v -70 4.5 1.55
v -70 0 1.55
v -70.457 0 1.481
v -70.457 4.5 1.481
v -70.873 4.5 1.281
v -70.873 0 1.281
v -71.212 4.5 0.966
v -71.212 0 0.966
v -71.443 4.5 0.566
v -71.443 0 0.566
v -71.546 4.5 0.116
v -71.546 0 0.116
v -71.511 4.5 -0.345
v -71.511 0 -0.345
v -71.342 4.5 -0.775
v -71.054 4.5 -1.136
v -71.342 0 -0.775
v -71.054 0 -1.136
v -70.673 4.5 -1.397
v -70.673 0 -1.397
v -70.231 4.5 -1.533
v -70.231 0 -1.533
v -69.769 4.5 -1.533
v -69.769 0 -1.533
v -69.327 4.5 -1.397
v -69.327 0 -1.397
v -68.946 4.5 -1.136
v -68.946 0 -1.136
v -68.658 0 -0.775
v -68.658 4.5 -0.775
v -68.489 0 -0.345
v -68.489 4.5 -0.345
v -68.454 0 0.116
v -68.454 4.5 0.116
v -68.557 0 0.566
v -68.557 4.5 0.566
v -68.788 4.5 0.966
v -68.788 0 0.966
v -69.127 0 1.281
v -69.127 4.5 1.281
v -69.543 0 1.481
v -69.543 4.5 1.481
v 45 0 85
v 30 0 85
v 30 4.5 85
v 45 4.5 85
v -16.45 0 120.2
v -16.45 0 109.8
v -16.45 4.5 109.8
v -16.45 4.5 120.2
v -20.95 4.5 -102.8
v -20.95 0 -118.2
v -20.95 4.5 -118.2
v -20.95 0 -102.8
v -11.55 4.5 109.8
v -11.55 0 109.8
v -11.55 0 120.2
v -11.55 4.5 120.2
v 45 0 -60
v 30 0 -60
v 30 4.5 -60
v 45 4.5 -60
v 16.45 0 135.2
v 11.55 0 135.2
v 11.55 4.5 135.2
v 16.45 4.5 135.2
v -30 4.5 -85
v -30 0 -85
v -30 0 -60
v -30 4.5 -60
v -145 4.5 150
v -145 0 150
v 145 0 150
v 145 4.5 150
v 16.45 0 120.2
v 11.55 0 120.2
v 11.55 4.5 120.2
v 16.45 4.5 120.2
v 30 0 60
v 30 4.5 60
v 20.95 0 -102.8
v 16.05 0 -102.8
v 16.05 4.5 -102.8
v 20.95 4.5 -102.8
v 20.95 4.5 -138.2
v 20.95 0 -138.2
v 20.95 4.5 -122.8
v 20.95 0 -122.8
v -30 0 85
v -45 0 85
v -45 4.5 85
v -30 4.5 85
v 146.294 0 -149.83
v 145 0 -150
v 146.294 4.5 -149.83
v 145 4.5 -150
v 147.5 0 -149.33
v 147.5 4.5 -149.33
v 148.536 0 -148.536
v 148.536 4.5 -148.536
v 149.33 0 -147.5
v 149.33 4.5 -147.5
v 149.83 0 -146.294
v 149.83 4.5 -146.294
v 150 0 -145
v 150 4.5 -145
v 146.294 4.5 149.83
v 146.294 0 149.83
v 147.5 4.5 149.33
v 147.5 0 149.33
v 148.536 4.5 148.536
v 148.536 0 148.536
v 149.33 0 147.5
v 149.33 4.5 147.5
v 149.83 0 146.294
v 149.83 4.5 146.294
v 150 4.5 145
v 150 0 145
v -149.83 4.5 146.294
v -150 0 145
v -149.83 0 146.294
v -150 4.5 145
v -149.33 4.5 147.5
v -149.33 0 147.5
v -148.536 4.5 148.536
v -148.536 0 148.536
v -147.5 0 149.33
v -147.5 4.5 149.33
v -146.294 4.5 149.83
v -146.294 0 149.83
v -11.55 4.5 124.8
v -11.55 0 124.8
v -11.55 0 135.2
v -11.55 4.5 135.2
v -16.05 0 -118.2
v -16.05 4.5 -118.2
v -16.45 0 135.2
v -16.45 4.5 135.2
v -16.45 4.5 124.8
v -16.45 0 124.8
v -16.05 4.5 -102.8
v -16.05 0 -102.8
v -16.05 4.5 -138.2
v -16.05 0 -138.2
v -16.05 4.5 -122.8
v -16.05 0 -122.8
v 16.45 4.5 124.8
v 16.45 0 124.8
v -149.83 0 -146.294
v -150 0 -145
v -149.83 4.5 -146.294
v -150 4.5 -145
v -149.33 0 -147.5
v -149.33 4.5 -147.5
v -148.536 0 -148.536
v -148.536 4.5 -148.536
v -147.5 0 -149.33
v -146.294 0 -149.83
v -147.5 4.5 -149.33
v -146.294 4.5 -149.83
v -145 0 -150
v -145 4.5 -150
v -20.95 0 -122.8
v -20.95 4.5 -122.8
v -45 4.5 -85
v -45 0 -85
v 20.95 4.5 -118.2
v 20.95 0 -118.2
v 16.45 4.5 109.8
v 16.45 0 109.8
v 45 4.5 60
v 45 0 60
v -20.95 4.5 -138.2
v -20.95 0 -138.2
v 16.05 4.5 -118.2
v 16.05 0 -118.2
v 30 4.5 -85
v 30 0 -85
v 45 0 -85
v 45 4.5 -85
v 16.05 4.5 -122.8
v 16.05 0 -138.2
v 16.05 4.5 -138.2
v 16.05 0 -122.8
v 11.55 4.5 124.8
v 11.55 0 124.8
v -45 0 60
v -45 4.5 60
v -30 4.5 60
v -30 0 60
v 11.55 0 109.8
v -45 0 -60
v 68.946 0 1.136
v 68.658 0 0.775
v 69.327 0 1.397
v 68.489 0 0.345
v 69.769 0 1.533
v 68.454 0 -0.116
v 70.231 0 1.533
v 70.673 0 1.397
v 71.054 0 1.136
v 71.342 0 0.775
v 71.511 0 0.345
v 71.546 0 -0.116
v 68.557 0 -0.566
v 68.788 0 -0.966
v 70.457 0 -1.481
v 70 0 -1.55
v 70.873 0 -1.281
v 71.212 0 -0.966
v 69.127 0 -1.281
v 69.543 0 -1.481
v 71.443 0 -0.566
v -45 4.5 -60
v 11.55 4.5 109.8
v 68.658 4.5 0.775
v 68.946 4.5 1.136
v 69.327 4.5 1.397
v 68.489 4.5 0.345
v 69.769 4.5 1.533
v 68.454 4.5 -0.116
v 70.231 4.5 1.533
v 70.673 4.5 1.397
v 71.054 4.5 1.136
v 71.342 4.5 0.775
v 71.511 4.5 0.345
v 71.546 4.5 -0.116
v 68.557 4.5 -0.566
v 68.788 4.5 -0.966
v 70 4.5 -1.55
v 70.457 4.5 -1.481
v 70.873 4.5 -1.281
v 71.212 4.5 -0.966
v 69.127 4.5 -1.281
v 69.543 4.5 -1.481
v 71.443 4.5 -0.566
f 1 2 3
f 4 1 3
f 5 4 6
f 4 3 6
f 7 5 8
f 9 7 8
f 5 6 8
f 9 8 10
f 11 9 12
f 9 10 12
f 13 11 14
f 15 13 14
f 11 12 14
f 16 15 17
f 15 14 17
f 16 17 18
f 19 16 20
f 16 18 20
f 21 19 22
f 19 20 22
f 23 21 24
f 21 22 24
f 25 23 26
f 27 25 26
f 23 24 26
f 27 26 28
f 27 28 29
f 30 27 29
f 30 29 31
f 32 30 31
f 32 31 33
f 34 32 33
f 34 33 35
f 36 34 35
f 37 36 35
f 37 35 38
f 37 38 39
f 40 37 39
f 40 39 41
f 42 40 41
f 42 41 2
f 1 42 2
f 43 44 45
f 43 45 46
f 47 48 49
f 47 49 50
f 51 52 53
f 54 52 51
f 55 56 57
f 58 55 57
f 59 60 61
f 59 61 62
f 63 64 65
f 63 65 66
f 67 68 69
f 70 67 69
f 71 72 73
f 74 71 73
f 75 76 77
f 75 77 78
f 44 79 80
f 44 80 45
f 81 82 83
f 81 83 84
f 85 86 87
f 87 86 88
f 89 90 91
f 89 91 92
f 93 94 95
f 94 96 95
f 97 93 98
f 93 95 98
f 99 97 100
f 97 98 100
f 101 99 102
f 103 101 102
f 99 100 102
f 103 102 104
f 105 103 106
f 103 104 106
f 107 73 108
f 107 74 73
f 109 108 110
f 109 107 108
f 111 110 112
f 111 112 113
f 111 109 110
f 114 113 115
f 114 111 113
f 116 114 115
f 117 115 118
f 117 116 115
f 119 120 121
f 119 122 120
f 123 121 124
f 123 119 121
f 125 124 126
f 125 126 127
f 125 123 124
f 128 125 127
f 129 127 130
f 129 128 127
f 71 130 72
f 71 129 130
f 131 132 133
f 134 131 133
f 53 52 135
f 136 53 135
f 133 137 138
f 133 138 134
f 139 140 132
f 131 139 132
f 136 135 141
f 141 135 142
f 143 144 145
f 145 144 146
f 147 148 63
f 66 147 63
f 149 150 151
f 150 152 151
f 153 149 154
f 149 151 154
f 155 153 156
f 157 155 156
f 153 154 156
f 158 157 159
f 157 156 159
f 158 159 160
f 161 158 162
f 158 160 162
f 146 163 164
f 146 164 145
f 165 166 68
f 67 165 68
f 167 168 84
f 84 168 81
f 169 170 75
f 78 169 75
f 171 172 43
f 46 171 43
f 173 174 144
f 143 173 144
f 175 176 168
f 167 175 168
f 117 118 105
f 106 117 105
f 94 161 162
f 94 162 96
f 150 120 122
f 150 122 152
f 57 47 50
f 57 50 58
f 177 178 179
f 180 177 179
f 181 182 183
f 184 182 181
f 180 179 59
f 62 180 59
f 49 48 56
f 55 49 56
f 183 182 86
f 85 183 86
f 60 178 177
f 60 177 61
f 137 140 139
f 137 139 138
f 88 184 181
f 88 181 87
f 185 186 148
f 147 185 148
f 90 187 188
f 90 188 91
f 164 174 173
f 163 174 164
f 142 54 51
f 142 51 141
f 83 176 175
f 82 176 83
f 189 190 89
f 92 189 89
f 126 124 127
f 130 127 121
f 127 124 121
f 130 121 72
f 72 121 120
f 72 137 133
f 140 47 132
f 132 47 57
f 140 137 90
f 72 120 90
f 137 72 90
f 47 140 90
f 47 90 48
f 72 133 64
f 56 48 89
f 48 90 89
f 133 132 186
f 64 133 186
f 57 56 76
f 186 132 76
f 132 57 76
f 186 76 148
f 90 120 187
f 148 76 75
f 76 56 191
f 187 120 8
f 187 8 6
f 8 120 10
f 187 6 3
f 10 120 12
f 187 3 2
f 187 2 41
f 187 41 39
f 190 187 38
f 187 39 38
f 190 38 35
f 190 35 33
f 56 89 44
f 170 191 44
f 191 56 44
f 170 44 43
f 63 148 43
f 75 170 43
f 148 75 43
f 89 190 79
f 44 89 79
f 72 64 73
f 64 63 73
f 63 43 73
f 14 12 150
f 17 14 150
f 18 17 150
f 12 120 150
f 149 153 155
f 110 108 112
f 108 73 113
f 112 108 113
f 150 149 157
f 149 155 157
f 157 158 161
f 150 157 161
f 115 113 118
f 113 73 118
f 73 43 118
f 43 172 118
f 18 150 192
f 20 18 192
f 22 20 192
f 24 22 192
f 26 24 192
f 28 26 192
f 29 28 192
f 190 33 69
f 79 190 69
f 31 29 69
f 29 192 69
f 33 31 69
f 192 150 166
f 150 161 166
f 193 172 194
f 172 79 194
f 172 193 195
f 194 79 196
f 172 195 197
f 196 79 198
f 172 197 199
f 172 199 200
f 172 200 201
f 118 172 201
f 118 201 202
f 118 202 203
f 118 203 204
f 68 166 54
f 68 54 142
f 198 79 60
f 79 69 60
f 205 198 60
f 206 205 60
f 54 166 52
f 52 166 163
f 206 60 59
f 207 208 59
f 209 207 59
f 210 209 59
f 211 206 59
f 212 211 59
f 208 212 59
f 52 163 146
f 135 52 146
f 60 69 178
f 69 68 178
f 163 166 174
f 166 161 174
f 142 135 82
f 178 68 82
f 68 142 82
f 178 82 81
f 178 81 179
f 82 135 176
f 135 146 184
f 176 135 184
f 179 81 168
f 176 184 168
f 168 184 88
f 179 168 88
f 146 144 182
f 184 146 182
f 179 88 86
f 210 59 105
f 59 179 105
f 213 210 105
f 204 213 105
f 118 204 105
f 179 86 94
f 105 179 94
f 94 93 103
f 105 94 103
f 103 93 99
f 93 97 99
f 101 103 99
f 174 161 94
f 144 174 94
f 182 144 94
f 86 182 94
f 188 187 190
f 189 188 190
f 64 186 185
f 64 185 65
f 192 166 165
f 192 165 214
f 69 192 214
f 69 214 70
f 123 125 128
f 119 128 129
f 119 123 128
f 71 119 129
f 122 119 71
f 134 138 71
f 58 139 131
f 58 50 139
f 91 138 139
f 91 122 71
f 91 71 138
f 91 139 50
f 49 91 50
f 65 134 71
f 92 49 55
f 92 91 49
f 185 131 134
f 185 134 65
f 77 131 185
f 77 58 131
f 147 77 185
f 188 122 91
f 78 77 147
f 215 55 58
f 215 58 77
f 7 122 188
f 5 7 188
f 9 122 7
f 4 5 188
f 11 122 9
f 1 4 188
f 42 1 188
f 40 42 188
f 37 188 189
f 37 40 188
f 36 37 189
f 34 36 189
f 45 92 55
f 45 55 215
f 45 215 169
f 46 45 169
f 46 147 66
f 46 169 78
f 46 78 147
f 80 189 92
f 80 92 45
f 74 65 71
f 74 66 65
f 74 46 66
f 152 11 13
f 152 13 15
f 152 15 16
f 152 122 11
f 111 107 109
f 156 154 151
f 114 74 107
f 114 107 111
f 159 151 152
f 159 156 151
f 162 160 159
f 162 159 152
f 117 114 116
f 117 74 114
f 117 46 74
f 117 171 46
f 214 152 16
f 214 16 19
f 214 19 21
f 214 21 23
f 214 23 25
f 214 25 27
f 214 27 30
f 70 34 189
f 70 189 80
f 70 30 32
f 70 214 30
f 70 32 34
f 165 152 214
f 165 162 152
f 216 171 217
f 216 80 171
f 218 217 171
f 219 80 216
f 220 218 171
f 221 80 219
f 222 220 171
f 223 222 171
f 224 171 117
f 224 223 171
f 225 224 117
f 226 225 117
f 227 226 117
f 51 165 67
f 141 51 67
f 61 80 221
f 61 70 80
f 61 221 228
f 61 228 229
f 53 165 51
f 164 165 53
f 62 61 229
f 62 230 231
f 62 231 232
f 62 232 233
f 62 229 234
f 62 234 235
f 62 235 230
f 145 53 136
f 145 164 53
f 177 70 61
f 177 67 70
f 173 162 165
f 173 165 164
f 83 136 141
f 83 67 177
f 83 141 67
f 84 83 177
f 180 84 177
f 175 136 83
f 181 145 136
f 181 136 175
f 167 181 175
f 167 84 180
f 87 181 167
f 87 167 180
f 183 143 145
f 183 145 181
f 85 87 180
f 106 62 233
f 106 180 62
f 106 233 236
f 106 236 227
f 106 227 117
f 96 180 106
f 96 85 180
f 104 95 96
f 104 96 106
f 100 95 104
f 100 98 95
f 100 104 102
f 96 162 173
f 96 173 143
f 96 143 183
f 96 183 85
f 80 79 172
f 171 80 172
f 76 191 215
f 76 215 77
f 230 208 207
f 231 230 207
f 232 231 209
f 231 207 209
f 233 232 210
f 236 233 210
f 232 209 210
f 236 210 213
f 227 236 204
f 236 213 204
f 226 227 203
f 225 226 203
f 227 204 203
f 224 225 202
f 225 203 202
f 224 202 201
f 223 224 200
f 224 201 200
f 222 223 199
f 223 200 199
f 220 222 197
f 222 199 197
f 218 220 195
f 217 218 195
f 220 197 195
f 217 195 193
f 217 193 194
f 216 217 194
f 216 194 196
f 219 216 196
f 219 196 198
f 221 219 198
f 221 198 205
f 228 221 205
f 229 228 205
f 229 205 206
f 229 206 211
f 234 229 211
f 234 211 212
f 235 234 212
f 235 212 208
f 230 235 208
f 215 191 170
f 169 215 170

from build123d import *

# Parameters (mm, degrees)
SKETCH1_W           = 300
SKETCH1_H           = 300
BOSS_EXTRUDE1_DEPTH = 4.5
SKETCH3_W           = 4.9
SKETCH3_H           = 15.4
CUT_EXTRUDE1_DEPTH  = 213.179758695
SKETCH6_W           = 15
SKETCH6_H           = 25
CUT_EXTRUDE2_DEPTH  = 213.179758695
SKETCH7_W           = 4.9
SKETCH7_H           = 10.4
CUT_EXTRUDE3_DEPTH  = 213.179758695
SKETCH8_R           = 1.55
CUT_EXTRUDE4_DEPTH  = 213.179758695
FILLET1_R           = 5


with BuildPart() as part:
    # Sketch1 → Boss-Extrude1 (new body)
    with BuildSketch(Plane(origin=(0, 0, 0), x_dir=(1, 0, 0), z_dir=(0, 1, 0))):
        Rectangle(SKETCH1_W, SKETCH1_H)
    extrude(amount=BOSS_EXTRUDE1_DEPTH)

    # Sketch3 → Cut-Extrude1 (cut, through all)
    with BuildSketch(Plane.XZ):
        with Locations((18.5, -130.5)):
            Rectangle(SKETCH3_W, SKETCH3_H)
        with Locations((18.5, -110.5)):
            Rectangle(SKETCH3_W, SKETCH3_H)
        with Locations((-18.5, -110.5)):
            Rectangle(SKETCH3_W, SKETCH3_H)
        with Locations((-18.5, -130.5)):
            Rectangle(SKETCH3_W, SKETCH3_H)
    extrude(amount=-CUT_EXTRUDE1_DEPTH, mode=Mode.SUBTRACT)

    # Sketch6 → Cut-Extrude2 (cut, through all)
    with BuildSketch(Plane.XZ):
        with Locations((37.5, -72.5)):
            Rectangle(SKETCH6_W, SKETCH6_H)
        with Locations((37.5, 72.5)):
            Rectangle(SKETCH6_W, SKETCH6_H)
        with Locations((-37.5, 72.5)):
            Rectangle(SKETCH6_W, SKETCH6_H)
        with Locations((-37.5, -72.5)):
            Rectangle(SKETCH6_W, SKETCH6_H)
    extrude(amount=-CUT_EXTRUDE2_DEPTH, mode=Mode.SUBTRACT)

    # Sketch7 → Cut-Extrude3 (cut, through all)
    with BuildSketch(Plane.XZ):
        with Locations((14, 130)):
            Rectangle(SKETCH7_W, SKETCH7_H)
        with Locations((-14, 130)):
            Rectangle(SKETCH7_W, SKETCH7_H)
        with Locations((-14, 115)):
            Rectangle(SKETCH7_W, SKETCH7_H)
        with Locations((14, 115)):
            Rectangle(SKETCH7_W, SKETCH7_H)
    extrude(amount=-CUT_EXTRUDE3_DEPTH, mode=Mode.SUBTRACT)

    # Sketch8 → Cut-Extrude4 (cut, through all)
    with BuildSketch(Plane.XZ):
        with Locations(Location((70, 0, 0), (0, 0, 270))):
            Circle(SKETCH8_R)
        with Locations(Location((-70, 0, 0), (0, 0, 90))):
            Circle(SKETCH8_R)
    extrude(amount=-CUT_EXTRUDE4_DEPTH, mode=Mode.SUBTRACT)

    # Fillet1
    fillet1_edges = [part.edges().sort_by_distance(p)[0] for p in [
        (150, 2.25, 150),
        (-150, 2.25, 150),
        (-150, 2.25, -150),
        (150, 2.25, -150),
    ]]
    fillet(fillet1_edges, radius=FILLET1_R)


solid = part.part
